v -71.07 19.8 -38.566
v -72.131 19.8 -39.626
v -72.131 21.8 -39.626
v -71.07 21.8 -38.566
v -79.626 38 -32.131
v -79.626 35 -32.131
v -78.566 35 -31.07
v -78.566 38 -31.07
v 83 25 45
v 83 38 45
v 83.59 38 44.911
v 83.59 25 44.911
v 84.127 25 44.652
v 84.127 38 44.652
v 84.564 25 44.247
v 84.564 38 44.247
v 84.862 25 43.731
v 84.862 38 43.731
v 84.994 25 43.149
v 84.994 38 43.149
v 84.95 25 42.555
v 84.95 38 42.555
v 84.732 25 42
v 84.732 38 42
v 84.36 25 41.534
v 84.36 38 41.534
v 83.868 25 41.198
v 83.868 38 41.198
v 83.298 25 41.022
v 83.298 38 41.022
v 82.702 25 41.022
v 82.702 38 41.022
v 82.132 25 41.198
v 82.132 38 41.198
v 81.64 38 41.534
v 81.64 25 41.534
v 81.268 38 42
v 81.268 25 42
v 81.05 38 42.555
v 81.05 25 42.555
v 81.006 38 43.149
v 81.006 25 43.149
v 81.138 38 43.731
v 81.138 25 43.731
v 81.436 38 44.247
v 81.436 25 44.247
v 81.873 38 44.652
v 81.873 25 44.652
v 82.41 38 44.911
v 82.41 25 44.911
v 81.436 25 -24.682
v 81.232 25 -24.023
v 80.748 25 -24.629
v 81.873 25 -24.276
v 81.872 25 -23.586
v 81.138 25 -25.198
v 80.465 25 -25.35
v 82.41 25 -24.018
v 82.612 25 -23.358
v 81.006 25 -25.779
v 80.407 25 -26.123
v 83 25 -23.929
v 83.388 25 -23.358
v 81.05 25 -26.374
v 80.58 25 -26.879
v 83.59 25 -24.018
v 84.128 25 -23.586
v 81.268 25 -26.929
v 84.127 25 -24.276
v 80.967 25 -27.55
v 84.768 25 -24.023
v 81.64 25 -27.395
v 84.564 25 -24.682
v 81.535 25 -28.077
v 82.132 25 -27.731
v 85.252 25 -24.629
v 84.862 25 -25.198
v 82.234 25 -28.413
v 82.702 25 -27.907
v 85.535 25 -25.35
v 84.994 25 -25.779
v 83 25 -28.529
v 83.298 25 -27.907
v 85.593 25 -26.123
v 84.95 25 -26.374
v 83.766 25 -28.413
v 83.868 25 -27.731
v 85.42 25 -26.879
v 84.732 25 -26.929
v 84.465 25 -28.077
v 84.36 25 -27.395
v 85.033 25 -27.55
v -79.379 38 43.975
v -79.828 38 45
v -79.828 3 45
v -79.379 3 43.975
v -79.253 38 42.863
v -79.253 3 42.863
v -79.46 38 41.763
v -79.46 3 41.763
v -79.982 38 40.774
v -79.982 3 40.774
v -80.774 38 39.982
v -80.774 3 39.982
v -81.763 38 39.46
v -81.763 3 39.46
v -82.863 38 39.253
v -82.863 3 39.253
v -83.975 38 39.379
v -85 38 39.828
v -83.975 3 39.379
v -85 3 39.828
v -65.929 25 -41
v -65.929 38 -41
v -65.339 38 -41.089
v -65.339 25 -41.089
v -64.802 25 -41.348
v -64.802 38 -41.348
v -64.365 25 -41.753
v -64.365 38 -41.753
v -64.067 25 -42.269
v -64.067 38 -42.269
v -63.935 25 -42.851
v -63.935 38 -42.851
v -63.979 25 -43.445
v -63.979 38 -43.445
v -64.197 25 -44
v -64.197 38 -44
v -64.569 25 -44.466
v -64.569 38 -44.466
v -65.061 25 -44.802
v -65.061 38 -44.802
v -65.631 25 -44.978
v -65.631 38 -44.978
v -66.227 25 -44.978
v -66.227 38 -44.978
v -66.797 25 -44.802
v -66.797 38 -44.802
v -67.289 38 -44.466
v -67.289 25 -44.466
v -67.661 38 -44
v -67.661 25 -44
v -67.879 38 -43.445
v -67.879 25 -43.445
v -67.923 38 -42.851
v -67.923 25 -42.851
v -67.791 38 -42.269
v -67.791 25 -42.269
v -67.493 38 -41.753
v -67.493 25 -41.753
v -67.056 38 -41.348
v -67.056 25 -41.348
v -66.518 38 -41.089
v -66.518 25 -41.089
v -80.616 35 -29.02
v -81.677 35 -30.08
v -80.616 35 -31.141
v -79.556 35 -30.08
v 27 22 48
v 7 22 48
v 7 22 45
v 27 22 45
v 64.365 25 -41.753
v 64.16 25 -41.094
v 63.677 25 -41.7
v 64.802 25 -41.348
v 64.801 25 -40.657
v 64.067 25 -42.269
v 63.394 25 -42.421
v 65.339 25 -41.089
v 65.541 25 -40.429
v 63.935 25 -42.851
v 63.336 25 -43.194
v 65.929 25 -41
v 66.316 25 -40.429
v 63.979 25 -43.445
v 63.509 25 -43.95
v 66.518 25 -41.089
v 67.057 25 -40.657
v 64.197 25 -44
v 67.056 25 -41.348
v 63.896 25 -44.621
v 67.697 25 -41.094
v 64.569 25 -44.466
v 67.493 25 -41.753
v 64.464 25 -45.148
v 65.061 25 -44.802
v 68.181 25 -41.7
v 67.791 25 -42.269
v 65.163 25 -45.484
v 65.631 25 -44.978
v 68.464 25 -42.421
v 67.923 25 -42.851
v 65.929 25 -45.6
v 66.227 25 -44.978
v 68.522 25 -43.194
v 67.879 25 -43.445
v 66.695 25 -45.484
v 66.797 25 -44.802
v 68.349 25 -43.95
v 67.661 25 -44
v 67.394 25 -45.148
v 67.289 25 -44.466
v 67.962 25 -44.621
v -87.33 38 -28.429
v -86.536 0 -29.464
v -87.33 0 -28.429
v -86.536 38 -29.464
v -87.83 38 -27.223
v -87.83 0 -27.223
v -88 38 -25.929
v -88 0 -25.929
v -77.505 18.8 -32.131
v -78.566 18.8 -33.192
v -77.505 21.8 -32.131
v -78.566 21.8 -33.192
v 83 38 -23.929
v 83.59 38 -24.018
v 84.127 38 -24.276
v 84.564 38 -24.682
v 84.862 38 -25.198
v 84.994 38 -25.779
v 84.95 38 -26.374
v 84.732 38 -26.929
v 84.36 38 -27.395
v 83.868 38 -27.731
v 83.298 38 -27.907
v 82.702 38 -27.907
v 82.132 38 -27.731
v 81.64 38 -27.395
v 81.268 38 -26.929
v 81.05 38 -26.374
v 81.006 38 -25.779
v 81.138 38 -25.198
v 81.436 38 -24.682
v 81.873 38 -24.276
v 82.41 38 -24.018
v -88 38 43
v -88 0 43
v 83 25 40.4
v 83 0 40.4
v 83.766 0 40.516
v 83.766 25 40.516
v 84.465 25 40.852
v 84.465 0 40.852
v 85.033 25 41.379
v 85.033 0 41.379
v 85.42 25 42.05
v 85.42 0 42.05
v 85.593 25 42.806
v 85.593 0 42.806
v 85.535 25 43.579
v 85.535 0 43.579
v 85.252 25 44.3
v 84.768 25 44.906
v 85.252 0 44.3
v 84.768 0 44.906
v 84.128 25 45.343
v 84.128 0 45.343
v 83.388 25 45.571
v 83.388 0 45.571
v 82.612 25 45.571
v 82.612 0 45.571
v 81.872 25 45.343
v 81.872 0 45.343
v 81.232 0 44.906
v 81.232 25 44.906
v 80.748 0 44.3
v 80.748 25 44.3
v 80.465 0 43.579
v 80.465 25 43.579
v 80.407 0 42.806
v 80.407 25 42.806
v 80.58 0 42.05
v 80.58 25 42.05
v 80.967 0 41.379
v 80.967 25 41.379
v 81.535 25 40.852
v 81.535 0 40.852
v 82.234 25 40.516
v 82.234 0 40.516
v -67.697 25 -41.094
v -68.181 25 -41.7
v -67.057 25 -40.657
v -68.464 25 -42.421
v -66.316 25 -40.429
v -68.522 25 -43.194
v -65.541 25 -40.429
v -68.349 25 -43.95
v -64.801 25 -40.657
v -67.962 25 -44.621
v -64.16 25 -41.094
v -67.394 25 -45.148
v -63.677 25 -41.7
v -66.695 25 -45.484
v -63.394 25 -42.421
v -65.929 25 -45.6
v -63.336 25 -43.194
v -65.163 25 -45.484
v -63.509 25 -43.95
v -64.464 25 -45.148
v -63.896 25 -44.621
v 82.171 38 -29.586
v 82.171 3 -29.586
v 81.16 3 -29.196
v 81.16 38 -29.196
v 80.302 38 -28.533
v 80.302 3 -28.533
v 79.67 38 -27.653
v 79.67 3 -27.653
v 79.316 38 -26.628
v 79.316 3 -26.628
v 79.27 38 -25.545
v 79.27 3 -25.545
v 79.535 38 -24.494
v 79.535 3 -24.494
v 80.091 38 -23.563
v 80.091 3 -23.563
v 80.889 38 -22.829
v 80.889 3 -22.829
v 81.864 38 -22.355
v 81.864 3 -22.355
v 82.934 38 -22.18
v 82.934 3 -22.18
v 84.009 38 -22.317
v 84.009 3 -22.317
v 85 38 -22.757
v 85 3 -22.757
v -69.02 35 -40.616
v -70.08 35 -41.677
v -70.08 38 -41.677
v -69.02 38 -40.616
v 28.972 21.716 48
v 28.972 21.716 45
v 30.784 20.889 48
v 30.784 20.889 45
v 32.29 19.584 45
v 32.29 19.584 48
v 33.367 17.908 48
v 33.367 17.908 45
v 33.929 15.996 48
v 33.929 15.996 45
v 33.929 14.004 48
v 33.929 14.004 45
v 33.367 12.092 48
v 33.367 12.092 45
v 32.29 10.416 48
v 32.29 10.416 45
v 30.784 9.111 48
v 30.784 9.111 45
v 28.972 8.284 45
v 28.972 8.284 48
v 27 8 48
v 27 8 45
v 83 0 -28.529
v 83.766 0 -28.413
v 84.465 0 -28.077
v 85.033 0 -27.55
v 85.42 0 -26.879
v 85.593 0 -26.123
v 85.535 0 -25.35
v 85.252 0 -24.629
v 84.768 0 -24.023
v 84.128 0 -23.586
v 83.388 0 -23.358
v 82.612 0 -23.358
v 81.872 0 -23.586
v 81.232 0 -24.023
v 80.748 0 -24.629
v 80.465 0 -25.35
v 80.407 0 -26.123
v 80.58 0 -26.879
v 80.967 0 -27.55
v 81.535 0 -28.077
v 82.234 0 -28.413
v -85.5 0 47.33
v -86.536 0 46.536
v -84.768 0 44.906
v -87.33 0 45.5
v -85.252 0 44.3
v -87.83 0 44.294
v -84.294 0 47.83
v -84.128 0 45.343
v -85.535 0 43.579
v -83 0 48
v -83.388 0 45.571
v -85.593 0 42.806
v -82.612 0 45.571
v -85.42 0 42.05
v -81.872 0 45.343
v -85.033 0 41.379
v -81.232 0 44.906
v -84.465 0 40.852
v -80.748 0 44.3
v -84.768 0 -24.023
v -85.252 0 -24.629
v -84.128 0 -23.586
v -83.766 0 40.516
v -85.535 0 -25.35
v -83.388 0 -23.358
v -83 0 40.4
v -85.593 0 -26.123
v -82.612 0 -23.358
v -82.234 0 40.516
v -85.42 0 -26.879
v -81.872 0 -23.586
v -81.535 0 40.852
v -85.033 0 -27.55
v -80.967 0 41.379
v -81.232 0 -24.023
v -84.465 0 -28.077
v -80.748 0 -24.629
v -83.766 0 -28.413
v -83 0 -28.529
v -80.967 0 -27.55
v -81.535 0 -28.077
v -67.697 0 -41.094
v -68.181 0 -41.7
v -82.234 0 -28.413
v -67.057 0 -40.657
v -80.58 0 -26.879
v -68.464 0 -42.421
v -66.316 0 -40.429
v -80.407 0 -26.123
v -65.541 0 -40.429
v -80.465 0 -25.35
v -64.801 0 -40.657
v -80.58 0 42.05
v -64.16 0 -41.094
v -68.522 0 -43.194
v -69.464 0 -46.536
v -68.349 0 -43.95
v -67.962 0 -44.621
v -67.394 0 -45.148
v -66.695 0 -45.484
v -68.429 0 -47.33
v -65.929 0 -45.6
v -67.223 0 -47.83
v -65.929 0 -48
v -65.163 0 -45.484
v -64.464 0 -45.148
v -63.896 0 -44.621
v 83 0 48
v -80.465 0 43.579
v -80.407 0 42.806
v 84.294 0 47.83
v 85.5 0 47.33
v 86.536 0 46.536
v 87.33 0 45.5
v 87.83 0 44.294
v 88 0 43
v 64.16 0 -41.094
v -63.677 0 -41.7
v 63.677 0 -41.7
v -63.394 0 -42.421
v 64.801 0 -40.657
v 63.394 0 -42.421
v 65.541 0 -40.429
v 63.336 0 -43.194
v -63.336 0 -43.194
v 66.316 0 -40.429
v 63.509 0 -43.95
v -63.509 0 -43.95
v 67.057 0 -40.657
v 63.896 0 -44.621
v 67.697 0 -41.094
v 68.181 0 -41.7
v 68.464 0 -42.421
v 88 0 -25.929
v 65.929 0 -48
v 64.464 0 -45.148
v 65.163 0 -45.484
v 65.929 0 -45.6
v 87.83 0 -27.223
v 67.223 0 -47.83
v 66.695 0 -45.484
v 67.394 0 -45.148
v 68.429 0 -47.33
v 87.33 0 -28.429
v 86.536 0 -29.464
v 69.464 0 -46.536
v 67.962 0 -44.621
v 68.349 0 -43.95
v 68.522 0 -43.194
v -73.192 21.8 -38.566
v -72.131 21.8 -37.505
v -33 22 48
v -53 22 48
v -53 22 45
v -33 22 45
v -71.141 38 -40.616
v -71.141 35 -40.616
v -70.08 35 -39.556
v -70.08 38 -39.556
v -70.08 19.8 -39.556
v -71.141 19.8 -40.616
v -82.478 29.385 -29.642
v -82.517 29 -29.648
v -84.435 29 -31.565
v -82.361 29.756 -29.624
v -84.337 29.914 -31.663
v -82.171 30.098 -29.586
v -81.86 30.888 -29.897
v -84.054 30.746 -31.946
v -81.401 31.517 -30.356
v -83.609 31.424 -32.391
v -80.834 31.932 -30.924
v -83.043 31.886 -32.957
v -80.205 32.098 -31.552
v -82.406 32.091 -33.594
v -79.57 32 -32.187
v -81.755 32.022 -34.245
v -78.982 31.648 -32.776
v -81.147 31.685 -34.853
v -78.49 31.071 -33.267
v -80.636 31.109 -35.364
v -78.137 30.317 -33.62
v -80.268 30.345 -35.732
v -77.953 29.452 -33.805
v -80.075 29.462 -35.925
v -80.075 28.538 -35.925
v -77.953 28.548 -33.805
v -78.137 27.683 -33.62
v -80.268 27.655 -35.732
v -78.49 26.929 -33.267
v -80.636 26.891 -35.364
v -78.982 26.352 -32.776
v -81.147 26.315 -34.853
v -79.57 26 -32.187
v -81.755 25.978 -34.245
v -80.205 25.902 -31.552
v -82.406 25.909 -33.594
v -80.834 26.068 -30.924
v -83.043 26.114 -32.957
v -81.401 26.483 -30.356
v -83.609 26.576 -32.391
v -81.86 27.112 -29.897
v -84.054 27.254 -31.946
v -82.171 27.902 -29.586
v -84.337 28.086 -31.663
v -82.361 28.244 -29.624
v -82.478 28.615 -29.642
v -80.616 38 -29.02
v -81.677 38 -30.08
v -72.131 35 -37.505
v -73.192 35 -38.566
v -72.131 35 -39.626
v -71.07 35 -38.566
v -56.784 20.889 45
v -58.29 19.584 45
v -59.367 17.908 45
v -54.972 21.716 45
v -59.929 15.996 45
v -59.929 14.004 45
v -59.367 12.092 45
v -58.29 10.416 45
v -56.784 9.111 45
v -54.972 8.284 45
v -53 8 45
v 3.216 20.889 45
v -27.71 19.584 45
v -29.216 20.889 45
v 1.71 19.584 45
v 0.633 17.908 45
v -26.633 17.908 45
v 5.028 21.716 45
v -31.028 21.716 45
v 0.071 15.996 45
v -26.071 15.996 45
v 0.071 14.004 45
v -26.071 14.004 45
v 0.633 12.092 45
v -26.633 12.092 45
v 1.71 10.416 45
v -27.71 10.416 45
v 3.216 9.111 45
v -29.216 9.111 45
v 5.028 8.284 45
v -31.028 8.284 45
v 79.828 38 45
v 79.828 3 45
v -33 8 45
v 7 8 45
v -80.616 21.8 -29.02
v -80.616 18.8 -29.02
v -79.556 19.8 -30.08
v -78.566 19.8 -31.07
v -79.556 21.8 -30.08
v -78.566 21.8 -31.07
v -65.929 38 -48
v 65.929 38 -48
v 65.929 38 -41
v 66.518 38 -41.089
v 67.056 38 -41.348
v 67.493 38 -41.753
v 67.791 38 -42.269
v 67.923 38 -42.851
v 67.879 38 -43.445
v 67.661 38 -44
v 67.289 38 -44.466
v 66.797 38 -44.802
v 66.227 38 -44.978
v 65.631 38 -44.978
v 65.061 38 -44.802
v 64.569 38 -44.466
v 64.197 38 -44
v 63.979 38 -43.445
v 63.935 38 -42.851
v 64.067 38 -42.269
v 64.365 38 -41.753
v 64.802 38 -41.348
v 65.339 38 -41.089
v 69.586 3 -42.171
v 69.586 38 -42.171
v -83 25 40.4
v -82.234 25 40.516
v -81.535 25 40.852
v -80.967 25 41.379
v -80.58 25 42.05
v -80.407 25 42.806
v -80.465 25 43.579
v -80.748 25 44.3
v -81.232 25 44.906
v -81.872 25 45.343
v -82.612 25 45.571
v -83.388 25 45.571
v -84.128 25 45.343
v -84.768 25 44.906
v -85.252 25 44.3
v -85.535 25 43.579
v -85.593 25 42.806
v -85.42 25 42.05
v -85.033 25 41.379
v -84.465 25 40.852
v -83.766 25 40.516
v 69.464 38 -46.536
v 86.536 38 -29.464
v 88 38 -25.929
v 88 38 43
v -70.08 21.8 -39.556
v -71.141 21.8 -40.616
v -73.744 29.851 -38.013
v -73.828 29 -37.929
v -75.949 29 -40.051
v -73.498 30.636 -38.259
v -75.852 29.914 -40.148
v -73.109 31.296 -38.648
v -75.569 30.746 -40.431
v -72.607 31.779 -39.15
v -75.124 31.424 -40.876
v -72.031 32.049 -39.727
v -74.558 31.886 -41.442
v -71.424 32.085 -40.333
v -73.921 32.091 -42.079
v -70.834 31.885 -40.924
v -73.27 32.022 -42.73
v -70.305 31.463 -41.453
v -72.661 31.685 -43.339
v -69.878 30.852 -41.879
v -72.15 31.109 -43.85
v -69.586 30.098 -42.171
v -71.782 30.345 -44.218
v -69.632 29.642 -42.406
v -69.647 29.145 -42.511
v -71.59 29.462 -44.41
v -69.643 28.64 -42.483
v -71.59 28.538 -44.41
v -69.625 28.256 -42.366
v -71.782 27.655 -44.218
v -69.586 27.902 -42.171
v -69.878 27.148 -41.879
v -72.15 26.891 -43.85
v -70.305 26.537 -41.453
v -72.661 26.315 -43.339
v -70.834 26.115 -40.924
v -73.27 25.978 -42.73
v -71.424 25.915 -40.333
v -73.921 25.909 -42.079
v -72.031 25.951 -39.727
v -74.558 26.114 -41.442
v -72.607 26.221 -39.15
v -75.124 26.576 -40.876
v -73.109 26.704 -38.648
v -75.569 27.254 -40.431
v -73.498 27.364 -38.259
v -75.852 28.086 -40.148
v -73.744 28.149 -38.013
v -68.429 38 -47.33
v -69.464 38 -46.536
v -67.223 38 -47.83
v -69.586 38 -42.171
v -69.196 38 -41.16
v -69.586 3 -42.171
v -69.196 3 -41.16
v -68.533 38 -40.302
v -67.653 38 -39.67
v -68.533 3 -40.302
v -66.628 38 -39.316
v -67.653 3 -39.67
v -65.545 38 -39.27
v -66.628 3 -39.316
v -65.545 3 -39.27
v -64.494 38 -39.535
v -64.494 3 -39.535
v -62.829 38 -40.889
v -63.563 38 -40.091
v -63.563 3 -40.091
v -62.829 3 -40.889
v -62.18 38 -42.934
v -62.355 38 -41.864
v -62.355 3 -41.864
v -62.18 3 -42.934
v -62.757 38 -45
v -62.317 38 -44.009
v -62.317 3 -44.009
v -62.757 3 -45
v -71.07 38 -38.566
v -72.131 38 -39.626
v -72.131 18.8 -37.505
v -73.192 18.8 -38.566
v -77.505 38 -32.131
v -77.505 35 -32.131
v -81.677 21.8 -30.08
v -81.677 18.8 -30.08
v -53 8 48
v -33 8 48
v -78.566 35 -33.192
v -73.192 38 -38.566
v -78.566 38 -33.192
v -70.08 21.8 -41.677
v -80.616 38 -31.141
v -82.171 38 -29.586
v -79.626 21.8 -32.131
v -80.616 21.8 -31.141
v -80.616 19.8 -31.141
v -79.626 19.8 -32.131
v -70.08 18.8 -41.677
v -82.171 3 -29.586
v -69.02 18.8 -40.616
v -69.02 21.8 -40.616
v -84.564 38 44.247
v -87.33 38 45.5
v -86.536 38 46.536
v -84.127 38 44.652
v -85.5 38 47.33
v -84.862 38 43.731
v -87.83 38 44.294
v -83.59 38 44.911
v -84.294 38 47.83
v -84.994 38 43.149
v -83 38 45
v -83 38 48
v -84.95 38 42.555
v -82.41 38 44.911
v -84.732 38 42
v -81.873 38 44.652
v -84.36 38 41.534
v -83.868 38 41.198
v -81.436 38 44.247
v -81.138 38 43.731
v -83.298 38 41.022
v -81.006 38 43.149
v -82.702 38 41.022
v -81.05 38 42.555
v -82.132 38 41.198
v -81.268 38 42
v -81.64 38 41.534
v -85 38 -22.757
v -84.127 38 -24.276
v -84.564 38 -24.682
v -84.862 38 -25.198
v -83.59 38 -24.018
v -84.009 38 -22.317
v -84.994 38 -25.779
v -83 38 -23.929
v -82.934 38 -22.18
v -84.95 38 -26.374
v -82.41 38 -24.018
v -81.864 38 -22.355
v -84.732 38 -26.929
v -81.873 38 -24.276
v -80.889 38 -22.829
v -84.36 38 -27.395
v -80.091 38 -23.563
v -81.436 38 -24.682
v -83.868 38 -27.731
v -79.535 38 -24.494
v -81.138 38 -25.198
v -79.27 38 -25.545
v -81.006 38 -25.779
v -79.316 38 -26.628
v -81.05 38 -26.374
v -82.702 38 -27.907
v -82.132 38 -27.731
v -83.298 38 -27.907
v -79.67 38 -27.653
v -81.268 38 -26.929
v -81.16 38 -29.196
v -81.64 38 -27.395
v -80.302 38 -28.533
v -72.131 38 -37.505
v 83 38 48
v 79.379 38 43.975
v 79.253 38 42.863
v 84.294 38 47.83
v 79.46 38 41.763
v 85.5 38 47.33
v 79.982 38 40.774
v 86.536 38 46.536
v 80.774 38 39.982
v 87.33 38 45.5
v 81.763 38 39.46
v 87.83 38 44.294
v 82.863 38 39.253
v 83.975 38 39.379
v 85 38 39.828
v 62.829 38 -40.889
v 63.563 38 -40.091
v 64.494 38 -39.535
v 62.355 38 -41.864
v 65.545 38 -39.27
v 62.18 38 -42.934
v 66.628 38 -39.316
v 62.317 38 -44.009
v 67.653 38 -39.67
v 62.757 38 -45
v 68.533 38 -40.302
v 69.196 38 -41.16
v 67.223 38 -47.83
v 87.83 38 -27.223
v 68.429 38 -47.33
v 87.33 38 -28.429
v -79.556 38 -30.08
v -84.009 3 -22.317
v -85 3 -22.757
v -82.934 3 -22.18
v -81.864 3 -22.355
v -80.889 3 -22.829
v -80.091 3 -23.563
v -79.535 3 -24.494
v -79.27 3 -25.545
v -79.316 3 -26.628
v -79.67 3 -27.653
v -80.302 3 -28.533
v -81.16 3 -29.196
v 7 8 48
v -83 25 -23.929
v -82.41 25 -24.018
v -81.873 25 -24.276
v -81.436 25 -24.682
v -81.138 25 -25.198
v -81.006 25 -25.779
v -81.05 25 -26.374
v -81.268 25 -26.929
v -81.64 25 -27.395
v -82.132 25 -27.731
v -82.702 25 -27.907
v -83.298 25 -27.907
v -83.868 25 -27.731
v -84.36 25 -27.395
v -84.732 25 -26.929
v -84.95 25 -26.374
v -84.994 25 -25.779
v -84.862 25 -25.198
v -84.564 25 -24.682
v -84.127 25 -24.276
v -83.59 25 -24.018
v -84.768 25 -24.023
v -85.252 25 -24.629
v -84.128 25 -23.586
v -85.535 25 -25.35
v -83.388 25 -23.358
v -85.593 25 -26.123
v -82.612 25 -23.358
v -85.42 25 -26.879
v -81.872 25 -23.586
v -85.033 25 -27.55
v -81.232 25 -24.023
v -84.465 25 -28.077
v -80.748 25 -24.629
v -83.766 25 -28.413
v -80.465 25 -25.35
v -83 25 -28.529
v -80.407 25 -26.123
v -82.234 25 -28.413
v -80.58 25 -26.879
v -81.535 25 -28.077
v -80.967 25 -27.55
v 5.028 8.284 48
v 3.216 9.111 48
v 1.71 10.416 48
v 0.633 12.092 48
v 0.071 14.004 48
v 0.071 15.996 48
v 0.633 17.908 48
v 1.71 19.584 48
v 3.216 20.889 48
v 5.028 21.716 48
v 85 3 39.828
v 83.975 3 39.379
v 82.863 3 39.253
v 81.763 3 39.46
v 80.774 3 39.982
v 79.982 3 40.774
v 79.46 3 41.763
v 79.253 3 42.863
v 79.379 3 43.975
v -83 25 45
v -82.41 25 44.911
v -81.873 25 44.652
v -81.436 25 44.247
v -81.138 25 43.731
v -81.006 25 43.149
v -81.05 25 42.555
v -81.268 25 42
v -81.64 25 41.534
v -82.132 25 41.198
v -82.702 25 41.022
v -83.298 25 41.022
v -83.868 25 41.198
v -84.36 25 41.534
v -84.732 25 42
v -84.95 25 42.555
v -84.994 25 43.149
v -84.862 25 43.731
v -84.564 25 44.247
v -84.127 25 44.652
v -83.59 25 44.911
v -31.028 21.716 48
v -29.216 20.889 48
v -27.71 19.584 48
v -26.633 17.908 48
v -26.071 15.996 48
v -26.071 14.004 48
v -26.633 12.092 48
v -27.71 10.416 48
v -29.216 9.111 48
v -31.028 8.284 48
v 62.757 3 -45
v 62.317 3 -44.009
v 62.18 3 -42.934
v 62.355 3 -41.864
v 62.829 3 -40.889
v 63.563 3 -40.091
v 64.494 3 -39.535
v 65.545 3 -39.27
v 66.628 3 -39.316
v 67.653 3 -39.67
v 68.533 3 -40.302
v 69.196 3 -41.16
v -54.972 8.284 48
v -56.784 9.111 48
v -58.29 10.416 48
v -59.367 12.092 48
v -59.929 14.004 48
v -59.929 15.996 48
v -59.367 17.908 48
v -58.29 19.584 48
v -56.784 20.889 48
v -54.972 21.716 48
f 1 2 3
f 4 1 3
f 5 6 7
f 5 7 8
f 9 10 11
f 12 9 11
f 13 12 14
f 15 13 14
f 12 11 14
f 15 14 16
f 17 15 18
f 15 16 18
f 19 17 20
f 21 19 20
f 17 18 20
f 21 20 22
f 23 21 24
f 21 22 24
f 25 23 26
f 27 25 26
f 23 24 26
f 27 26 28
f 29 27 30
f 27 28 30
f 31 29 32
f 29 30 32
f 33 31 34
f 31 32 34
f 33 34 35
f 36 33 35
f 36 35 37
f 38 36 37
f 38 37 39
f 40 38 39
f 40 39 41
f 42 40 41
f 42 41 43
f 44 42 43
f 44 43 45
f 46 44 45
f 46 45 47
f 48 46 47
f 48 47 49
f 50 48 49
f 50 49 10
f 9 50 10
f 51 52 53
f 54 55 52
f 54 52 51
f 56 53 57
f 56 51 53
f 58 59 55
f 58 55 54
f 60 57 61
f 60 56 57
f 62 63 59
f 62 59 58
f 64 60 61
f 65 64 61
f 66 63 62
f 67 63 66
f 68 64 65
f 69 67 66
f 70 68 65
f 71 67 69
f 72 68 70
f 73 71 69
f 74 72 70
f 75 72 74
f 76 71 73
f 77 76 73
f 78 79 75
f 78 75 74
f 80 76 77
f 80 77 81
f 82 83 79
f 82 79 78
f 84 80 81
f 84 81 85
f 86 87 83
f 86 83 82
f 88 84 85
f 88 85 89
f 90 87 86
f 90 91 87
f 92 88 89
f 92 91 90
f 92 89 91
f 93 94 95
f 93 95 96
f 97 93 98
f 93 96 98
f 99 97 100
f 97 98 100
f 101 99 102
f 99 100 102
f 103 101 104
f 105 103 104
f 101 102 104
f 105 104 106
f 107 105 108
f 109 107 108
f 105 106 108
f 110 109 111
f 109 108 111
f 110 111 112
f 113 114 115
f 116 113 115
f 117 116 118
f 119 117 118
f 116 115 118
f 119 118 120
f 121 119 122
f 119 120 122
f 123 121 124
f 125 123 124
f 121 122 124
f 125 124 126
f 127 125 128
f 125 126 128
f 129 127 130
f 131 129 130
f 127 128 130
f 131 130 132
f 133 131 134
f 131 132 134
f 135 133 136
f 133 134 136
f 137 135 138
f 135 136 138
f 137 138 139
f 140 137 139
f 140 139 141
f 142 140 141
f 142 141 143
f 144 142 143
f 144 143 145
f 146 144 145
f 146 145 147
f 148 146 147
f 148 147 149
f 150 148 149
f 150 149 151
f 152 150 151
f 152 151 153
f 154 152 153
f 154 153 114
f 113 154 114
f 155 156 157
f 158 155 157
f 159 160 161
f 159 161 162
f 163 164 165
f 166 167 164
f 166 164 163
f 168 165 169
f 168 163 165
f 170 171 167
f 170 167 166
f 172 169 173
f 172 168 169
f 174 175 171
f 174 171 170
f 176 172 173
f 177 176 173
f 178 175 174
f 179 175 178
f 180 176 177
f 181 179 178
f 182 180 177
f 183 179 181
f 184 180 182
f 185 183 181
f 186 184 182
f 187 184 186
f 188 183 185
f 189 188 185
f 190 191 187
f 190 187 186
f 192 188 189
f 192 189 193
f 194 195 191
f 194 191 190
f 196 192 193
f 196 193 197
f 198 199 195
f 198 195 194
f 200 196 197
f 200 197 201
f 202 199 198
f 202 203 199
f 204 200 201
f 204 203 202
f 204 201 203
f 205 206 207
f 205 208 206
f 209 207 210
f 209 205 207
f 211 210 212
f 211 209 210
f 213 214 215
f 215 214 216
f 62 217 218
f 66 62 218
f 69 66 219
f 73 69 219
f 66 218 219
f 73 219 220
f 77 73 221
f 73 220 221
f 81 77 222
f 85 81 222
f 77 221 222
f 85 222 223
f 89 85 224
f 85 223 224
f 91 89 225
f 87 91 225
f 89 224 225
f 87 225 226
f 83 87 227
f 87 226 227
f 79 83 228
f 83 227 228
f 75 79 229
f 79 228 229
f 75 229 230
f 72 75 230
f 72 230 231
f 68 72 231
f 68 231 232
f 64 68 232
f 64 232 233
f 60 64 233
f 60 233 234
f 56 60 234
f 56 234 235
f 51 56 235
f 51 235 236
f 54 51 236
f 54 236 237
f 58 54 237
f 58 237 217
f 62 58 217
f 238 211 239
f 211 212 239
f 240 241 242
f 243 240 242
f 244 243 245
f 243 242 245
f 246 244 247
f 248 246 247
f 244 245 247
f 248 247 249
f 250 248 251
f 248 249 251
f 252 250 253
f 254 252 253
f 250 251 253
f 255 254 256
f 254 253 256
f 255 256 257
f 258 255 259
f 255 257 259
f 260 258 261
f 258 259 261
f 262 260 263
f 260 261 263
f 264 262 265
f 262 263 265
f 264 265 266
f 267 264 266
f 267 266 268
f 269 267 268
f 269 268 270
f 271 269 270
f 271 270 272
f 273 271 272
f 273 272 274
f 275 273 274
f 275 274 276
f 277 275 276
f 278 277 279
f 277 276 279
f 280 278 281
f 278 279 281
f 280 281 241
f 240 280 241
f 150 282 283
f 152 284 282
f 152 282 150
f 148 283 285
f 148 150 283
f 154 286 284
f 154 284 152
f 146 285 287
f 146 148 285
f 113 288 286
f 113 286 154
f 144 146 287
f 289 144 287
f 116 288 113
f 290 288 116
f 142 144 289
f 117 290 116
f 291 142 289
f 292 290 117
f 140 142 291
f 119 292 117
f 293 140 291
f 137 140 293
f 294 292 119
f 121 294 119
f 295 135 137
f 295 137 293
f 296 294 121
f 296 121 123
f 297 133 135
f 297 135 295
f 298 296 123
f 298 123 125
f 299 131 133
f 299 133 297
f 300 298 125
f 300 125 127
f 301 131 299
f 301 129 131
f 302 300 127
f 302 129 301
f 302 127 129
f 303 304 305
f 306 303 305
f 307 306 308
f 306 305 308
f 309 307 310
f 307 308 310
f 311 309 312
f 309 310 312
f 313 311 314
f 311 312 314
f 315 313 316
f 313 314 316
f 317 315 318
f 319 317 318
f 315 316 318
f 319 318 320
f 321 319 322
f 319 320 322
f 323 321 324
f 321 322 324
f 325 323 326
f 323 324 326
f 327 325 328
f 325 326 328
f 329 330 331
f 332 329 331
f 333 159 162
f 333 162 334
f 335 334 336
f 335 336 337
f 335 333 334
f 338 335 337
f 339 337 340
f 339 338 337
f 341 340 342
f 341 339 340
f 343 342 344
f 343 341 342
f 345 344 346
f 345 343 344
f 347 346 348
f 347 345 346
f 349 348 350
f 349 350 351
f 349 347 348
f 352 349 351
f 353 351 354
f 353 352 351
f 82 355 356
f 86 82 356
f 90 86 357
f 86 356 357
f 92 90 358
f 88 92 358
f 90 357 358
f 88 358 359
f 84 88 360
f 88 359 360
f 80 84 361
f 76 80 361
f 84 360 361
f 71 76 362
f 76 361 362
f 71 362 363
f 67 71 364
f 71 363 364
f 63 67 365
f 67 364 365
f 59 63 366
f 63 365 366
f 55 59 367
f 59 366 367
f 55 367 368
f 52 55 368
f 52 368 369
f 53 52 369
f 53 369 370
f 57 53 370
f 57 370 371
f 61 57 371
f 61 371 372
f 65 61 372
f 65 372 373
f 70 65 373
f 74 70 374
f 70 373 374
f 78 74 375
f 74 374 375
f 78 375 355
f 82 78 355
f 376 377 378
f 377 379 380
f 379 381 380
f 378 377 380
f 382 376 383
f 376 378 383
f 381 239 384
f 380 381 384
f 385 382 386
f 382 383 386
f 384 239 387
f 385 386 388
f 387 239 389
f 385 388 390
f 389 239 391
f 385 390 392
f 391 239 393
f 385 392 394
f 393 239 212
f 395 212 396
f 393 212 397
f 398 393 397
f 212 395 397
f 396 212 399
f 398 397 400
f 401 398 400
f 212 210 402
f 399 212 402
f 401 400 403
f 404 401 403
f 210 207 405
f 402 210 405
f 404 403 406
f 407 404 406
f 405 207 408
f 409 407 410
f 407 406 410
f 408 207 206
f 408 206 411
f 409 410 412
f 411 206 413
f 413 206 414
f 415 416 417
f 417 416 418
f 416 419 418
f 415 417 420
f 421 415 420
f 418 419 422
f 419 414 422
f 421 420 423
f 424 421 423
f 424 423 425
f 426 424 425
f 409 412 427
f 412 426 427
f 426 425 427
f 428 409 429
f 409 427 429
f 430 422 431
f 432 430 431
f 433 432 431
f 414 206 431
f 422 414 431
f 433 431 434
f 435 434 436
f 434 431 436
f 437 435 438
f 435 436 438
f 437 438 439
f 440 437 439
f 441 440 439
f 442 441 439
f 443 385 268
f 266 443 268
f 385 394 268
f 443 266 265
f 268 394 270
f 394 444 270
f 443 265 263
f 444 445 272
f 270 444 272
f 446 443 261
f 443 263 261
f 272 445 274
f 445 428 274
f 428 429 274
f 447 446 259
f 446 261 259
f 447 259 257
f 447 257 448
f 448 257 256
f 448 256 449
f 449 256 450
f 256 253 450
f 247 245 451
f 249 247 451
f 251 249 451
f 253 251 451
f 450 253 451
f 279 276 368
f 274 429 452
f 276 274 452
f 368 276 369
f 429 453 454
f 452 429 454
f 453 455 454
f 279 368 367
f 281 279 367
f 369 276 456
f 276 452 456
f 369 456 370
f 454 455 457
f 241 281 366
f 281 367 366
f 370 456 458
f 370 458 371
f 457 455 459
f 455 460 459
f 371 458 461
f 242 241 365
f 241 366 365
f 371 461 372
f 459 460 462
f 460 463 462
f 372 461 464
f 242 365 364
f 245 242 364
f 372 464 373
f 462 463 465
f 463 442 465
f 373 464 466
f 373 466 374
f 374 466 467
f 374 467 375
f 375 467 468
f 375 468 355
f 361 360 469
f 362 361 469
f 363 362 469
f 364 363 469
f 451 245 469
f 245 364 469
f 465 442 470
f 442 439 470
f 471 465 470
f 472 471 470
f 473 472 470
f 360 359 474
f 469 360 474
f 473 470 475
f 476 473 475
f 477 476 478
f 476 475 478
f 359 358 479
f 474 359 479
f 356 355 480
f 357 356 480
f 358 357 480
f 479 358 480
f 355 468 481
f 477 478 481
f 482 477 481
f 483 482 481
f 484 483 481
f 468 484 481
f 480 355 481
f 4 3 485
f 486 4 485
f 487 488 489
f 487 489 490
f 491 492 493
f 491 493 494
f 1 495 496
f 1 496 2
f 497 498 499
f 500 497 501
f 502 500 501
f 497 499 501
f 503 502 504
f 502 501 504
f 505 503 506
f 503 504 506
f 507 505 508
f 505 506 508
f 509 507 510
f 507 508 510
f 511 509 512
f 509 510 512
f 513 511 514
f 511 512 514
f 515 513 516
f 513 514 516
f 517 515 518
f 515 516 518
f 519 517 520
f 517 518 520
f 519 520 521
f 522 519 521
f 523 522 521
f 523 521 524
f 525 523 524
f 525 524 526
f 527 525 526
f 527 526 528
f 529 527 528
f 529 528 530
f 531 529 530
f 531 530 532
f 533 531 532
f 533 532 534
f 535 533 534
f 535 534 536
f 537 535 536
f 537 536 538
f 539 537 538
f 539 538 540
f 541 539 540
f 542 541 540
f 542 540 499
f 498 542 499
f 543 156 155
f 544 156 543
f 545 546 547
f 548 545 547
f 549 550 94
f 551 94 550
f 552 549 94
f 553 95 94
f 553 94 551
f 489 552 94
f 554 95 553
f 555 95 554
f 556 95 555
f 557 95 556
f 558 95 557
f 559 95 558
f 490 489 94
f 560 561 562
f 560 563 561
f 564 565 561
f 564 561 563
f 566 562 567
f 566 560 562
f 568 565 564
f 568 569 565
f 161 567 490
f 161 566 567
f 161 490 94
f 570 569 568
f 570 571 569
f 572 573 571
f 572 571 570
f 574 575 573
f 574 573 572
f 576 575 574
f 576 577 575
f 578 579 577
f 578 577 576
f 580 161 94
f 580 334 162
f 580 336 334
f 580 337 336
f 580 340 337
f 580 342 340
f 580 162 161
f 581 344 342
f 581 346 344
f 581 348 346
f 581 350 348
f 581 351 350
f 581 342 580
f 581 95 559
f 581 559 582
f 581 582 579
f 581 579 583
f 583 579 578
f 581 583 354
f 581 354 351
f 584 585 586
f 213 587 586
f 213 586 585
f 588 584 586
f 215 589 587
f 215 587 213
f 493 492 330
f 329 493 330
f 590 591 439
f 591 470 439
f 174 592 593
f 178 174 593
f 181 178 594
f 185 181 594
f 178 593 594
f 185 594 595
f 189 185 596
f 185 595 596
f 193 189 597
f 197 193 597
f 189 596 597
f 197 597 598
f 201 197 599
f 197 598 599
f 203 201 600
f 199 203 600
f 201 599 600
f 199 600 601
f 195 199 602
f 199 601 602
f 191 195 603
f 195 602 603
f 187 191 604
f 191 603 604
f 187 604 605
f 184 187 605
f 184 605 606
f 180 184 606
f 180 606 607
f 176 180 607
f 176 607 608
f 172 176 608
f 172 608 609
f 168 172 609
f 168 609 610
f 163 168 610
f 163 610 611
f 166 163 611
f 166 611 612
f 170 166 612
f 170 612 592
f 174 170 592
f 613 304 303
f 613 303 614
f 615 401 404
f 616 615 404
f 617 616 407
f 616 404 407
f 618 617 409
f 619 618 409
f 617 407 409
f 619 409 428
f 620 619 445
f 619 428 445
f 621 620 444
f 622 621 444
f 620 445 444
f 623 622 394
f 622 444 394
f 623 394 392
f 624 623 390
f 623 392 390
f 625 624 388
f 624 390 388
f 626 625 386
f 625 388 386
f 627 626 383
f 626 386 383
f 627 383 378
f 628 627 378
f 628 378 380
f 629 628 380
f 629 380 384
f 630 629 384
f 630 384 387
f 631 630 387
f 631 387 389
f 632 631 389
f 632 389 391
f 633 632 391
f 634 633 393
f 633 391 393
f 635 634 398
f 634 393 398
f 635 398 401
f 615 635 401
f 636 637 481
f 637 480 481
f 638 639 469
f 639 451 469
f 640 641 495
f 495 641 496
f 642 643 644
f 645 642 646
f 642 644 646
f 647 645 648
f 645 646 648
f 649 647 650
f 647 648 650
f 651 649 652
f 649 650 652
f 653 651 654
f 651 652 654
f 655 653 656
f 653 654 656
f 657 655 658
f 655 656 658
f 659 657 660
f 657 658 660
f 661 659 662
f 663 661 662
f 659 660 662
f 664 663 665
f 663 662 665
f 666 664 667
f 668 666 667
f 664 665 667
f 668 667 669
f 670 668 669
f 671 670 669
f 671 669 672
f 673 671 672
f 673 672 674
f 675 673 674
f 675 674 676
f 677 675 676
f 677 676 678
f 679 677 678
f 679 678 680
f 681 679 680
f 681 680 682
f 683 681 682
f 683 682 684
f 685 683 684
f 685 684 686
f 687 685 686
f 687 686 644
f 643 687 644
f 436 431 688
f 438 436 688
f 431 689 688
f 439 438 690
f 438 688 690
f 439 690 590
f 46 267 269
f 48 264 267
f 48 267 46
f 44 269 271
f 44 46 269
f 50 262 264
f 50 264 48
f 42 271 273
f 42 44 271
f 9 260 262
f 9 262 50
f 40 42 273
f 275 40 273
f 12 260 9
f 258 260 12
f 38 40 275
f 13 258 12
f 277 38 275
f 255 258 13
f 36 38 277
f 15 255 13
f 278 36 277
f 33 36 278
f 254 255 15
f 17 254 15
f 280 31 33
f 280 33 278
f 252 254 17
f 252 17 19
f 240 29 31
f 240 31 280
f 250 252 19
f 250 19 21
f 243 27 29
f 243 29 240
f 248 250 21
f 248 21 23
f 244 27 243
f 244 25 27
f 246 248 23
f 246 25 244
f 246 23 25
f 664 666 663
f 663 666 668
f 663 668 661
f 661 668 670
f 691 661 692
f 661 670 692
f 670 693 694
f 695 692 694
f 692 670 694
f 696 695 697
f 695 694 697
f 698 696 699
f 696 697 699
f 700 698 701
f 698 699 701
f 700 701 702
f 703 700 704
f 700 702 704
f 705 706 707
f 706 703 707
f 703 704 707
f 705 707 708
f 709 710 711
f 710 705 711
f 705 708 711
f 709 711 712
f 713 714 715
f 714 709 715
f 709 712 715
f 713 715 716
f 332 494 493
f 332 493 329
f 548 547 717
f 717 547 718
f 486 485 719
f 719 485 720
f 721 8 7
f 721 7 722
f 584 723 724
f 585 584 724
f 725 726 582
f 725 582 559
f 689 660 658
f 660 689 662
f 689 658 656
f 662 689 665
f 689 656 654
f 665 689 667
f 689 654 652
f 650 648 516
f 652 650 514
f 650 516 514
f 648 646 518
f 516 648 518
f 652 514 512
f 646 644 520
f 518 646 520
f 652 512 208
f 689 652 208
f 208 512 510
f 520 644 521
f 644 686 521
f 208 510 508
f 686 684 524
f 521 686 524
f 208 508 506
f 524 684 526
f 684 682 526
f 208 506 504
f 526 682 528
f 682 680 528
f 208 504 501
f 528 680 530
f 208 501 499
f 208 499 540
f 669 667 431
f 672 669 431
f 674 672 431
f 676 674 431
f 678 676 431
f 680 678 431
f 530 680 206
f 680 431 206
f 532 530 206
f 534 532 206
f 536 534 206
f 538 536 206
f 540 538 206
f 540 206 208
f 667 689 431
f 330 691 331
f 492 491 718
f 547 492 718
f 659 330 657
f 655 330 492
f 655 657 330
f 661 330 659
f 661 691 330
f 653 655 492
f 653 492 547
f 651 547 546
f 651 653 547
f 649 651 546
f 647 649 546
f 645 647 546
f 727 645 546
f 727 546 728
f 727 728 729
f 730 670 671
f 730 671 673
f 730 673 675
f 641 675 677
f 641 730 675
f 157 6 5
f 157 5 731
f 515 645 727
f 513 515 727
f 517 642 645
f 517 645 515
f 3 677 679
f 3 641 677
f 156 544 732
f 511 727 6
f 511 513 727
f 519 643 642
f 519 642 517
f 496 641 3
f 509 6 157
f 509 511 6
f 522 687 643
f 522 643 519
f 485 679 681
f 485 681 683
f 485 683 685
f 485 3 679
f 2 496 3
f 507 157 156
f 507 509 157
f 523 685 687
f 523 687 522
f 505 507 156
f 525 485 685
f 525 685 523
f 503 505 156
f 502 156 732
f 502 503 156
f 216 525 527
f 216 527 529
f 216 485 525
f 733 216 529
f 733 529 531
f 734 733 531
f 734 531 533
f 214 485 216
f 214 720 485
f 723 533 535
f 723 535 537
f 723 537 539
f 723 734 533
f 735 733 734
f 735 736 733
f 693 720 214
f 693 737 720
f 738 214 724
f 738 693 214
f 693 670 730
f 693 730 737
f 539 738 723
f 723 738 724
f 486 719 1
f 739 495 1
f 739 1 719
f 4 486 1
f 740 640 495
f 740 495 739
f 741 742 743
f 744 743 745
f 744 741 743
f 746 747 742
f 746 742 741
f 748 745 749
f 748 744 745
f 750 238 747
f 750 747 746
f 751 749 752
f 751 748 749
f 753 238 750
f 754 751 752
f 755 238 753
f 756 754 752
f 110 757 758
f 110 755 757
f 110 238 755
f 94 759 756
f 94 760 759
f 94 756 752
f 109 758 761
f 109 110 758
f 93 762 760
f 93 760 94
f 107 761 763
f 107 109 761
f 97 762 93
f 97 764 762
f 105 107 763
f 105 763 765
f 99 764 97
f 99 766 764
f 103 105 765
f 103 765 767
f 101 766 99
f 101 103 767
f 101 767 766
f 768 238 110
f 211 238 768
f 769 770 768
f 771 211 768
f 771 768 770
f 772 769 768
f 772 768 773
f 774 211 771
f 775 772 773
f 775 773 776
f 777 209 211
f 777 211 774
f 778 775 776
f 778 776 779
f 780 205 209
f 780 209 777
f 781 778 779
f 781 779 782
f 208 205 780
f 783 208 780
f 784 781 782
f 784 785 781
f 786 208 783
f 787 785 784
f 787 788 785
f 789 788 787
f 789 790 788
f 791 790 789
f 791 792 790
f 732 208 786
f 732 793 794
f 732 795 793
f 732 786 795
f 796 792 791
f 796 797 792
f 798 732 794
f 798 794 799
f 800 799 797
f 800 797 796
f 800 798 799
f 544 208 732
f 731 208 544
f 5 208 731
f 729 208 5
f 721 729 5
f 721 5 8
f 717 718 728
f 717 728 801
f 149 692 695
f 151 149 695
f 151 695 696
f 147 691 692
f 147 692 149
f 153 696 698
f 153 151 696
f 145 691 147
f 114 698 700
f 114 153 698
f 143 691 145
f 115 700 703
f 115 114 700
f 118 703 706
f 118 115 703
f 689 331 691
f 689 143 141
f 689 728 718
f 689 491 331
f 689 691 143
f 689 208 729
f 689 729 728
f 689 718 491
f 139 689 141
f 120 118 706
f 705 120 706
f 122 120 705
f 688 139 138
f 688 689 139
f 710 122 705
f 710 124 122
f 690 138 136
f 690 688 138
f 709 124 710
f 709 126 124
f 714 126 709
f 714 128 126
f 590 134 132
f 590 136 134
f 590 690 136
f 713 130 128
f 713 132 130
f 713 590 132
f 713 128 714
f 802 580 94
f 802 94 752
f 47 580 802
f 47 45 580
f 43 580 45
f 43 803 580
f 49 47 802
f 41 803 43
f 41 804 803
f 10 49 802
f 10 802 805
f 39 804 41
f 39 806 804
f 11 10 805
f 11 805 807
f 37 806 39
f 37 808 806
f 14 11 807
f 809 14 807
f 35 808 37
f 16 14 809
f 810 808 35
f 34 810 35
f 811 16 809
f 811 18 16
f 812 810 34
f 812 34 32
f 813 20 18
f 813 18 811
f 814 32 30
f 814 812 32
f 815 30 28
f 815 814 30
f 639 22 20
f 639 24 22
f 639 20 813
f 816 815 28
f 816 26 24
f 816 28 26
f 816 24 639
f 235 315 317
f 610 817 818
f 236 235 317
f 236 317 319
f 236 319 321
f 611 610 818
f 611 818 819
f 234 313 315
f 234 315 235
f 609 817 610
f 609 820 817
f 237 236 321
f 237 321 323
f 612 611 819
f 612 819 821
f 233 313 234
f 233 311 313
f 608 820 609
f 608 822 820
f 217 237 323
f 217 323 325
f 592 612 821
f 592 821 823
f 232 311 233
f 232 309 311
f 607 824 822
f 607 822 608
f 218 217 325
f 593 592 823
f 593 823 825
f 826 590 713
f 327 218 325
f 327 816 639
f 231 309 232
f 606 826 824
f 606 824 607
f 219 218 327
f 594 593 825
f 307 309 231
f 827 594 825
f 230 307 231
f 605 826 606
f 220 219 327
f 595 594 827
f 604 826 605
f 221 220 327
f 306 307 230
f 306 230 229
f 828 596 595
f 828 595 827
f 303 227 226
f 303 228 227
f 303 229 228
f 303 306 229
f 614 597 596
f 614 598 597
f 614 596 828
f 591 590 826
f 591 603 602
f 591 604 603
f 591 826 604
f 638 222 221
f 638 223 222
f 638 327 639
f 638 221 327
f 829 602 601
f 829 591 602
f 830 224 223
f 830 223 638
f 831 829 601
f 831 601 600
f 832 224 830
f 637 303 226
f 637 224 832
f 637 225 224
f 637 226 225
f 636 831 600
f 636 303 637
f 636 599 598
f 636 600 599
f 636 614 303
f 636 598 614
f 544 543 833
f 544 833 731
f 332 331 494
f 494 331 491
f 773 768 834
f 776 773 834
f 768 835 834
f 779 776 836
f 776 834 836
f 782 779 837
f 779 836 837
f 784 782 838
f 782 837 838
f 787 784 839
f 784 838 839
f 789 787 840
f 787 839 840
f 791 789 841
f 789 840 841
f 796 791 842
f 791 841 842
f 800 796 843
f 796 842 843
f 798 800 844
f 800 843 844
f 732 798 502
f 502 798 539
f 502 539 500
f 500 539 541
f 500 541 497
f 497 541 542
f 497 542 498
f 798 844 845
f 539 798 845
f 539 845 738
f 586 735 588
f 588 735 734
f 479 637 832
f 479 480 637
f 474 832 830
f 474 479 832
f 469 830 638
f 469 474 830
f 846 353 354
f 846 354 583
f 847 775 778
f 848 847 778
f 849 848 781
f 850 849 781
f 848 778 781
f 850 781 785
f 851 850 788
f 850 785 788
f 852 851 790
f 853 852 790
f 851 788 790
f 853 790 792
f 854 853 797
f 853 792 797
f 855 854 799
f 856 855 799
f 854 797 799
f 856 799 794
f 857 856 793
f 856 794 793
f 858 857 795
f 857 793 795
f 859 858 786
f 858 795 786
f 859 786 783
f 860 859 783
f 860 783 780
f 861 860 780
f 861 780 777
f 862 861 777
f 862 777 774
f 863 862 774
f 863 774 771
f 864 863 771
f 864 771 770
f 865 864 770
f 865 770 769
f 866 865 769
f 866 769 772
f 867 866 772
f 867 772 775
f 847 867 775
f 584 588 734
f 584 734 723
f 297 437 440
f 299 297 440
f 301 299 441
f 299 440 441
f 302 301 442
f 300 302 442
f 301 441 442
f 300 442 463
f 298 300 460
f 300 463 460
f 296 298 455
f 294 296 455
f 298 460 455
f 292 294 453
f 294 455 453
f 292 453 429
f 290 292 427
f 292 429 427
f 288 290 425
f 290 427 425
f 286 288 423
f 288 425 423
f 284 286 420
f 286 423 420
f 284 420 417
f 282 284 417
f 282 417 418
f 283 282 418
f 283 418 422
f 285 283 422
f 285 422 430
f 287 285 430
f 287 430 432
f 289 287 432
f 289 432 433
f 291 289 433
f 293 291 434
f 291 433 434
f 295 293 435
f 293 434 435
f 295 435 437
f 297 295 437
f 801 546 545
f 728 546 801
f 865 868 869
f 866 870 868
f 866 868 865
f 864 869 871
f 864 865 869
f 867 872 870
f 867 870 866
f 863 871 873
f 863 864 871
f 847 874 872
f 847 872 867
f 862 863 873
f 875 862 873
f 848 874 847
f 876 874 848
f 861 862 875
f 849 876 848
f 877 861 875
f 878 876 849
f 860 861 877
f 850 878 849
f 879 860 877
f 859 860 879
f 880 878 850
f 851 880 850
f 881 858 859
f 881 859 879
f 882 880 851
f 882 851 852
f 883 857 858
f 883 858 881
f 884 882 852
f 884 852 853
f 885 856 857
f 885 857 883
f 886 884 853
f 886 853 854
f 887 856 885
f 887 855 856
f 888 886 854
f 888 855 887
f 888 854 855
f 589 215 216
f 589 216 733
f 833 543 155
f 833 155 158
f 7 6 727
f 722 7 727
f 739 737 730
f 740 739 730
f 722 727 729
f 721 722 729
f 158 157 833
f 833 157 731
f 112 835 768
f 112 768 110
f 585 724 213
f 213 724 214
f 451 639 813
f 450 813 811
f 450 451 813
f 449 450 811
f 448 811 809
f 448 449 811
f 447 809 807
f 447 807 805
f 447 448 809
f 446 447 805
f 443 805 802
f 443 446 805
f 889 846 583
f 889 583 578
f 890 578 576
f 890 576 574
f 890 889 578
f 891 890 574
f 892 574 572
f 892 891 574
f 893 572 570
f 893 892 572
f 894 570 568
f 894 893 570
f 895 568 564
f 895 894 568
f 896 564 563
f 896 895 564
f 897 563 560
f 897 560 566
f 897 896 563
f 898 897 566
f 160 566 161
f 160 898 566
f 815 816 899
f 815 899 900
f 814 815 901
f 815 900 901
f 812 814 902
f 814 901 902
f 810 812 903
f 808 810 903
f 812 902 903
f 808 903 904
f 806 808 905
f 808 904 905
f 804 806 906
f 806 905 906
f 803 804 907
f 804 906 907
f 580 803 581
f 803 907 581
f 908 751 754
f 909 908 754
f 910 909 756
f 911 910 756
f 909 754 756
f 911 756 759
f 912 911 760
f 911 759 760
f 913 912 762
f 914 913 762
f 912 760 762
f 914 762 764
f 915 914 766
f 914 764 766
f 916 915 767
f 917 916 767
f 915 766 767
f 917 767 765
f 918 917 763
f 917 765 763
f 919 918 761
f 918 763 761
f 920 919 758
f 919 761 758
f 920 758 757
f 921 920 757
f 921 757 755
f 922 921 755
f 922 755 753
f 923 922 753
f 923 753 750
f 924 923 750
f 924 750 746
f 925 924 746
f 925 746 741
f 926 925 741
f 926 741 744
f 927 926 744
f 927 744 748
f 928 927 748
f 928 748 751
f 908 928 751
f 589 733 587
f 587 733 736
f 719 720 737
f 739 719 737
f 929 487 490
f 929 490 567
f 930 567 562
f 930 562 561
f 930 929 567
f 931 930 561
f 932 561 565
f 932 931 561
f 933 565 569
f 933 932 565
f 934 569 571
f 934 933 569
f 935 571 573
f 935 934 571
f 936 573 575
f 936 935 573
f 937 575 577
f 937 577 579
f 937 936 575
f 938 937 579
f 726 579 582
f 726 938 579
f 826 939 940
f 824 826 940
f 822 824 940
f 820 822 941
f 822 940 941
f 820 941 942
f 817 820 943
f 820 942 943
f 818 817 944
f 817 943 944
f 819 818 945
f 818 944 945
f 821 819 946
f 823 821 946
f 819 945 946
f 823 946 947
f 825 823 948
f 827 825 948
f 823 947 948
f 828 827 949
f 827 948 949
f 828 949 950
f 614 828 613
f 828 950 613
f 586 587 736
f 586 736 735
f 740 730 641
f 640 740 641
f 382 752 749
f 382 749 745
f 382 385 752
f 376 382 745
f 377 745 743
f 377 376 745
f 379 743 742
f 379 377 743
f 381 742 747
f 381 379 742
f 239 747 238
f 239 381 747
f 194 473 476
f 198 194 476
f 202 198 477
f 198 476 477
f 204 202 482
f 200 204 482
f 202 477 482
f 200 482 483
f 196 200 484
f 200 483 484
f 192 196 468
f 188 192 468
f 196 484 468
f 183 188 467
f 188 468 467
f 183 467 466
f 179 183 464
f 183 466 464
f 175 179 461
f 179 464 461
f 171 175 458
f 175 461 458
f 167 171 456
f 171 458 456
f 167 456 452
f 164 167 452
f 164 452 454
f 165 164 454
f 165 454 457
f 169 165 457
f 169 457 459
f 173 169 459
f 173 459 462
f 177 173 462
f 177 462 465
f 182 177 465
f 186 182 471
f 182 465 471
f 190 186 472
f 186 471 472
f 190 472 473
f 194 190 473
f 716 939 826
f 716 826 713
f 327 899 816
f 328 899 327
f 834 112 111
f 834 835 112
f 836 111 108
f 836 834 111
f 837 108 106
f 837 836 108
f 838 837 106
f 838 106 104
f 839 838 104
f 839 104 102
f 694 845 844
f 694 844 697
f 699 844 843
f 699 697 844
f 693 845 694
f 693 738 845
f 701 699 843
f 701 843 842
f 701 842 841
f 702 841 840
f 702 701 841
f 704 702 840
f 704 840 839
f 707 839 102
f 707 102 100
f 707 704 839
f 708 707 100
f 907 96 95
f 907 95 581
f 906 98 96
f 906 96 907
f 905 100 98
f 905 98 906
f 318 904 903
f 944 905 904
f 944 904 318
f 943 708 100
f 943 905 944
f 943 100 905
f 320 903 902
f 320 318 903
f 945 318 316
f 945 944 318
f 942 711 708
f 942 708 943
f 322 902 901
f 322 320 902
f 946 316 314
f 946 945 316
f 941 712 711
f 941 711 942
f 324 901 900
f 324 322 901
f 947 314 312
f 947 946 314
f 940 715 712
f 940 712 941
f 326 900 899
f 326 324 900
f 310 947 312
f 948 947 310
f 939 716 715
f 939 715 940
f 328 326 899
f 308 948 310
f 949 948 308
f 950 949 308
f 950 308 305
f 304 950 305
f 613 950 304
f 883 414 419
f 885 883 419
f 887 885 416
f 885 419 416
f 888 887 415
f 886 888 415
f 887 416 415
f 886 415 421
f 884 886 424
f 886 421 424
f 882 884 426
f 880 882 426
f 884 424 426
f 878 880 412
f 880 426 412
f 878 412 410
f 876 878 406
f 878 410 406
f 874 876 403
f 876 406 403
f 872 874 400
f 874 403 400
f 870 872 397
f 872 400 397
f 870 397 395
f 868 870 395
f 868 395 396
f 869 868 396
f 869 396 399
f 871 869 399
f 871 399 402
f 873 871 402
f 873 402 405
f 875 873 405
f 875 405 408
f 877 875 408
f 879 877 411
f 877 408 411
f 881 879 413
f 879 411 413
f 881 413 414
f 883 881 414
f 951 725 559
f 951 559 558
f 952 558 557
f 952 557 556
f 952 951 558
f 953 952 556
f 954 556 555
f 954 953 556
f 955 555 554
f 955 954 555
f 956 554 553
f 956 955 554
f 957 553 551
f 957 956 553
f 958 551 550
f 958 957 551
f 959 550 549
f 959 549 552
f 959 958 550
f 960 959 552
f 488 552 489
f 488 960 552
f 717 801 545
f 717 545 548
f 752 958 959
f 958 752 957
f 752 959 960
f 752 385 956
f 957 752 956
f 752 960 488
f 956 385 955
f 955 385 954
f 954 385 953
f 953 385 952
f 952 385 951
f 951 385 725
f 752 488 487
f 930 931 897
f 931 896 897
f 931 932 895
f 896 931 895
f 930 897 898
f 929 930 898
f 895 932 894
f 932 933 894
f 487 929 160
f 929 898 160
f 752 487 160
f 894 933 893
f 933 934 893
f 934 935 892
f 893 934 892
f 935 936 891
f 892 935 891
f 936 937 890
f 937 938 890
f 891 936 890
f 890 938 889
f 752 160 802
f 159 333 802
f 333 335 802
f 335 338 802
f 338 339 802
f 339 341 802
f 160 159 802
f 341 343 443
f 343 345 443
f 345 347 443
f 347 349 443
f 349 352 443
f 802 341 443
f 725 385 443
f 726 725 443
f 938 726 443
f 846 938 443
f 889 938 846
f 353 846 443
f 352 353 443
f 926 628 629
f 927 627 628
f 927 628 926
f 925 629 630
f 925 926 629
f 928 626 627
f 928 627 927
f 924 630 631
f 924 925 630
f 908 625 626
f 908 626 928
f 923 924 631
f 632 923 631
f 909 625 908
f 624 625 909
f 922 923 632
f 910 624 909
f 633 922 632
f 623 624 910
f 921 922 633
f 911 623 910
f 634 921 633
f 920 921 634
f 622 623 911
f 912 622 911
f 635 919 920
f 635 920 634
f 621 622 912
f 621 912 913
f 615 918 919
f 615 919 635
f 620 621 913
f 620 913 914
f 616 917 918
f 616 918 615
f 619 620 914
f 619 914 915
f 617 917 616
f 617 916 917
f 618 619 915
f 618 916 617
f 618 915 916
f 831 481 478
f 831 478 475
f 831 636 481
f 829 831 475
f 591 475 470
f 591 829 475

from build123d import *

# Parameters (mm, degrees)
BOSS_EXTRUDE1_DEPTH = 3
BOSS_EXTRUDE2_DEPTH = 35
SKETCH3_R           = 3.1
CUT_EXTRUDE1_DEPTH  = 10
SKETCH4_W           = 1.5
SKETCH4_H           = 3
BOSS_EXTRUDE3_DEPTH = 1.5
SKETCH6_R           = 3.75
BOSS_EXTRUDE4_DEPTH = 35
SKETCH7_R           = 2
CUT_EXTRUDE2_DEPTH  = 38
SKETCH8_R           = 2.6
CUT_EXTRUDE3_DEPTH  = 25
CUT_EXTRUDE4_DEPTH  = 3
FILLET1_R           = 5


with BuildPart() as part:
    # Sketch1 → Boss-Extrude1 (new body)
    with BuildSketch(Plane(origin=(0, 0, 0), x_dir=(1, 0, 0), z_dir=(0, 1, 0))):
        Polygon((-68, 48), (-88, 28), (-88, -48), (88, -48), (88, 28), (68, 48), align=None)
    extrude(amount=BOSS_EXTRUDE1_DEPTH)

    # Sketch2 → Boss-Extrude2 (add)
    with BuildSketch(Plane(origin=(0, 3, 0), x_dir=(1, 0, 0), z_dir=(0, 1, 0))):
        Polygon((88, 28), (68, 48), (-68, 48), (-88, 28), (-88, -48), (88, -48), align=None)
        Polygon((85, -45), (85, 26.757359313), (66.757359313, 45), (-66.757359313, 45), (-85, 26.757359313), (-85, -45), align=None, mode=Mode.SUBTRACT)
    extrude(amount=BOSS_EXTRUDE2_DEPTH)

    # Sketch3 → Cut-Extrude1 (cut)
    with BuildSketch(Plane(origin=(-58, 0, -58), x_dir=(-0.7071067811865475, 0, 0.7071067811865477), z_dir=(-0.7071067811865477, 0, -0.7071067811865475))):
        with Locations((34.284271247, 29)):
            Circle(SKETCH3_R)
        with Locations((22.284271247, 29)):
            Circle(SKETCH3_R)
    extrude(amount=-CUT_EXTRUDE1_DEPTH, mode=Mode.SUBTRACT)

    # Sketch4 → Boss-Extrude3 (add)
    with BuildSketch(Plane(origin=(-55.878679656, 0, -55.878679656), x_dir=(0.7071067811865476, 0, -0.7071067811865475), z_dir=(0.7071067811865475, 0, 0.7071067811865476))):
        with Locations((-20.834271247, 36.5)):
            Rectangle(SKETCH4_W, SKETCH4_H)
        Polygon((-22.284271247, 18.8), (-22.284271247, 19.8), (-22.984271247, 19.8), (-22.984271247, 21.8), (-24.484271247, 21.8), (-24.484271247, 18.8), align=None)
        Polygon((-21.584271247, 19.8), (-22.284271247, 19.8), (-22.284271247, 18.8), (-20.084271247, 18.8), (-20.084271247, 21.8), (-21.584271247, 21.8), align=None)
        Polygon((-32.084271247, 18.8), (-32.084271247, 21.8), (-33.584271247, 21.8), (-33.584271247, 19.8), (-34.984271247, 19.8), (-34.984271247, 21.8), (-36.484271247, 21.8), (-36.484271247, 18.8), align=None)
        with Locations((-35.734271247, 36.5)):
            Rectangle(SKETCH4_W, SKETCH4_H)
        with Locations((-23.734271247, 36.5)):
            Rectangle(SKETCH4_W, SKETCH4_H)
        with Locations((-32.834271247, 36.5)):
            Rectangle(SKETCH4_W, SKETCH4_H)
    extrude(amount=BOSS_EXTRUDE3_DEPTH)

    # Sketch6 → Boss-Extrude4 (add)
    with BuildSketch(Plane(origin=(0, 3, 0), x_dir=(1, 0, 0), z_dir=(0, 1, 0))):
        with Locations((-65.928932188, 43)):
            Circle(SKETCH6_R)
        with Locations((65.928932188, 43)):
            Circle(SKETCH6_R)
        with Locations((83, 25.928932188)):
            Circle(SKETCH6_R)
        with Locations((83, -43)):
            Circle(SKETCH6_R)
        with Locations((-83, -43)):
            Circle(SKETCH6_R)
        with Locations((-83, 25.928932188)):
            Circle(SKETCH6_R)
    extrude(amount=BOSS_EXTRUDE4_DEPTH)

    # Sketch7 → Cut-Extrude2 (cut)
    with BuildSketch(Plane(origin=(0, 38, 0), x_dir=(1, 0, 0), z_dir=(0, 1, 0))):
        with Locations(Location((-65.928932188, 43, 0), (0, 0, 270))):
            Circle(SKETCH7_R)
        with Locations(Location((-83, 25.928932188, 0), (0, 0, 270))):
            Circle(SKETCH7_R)
        with Locations(Location((-83, -43, 0), (0, 0, 270))):
            Circle(SKETCH7_R)
        with Locations(Location((83, -43, 0), (0, 0, 270))):
            Circle(SKETCH7_R)
        with Locations(Location((83, 25.928932188, 0), (0, 0, 270))):
            Circle(SKETCH7_R)
        with Locations(Location((65.928932188, 43, 0), (0, 0, 270))):
            Circle(SKETCH7_R)
    extrude(amount=-CUT_EXTRUDE2_DEPTH, mode=Mode.SUBTRACT)

    # Sketch8 → Cut-Extrude3 (cut)
    with BuildSketch(Plane.XZ):
        with Locations(Location((-83, 43, 0), (0, 0, 270))):
            Circle(SKETCH8_R)
        with Locations(Location((83, 43, 0), (0, 0, 270))):
            Circle(SKETCH8_R)
        with Locations(Location((83, -25.928932188, 0), (0, 0, 270))):
            Circle(SKETCH8_R)
        with Locations(Location((65.928932188, -43, 0), (0, 0, 270))):
            Circle(SKETCH8_R)
        with Locations(Location((-65.928932188, -43, 0), (0, 0, 270))):
            Circle(SKETCH8_R)
        with Locations(Location((-83, -25.928932188, 0), (0, 0, 270))):
            Circle(SKETCH8_R)
    extrude(amount=-CUT_EXTRUDE3_DEPTH, mode=Mode.SUBTRACT)

    # Sketch9 → Cut-Extrude4 (cut)
    with BuildSketch(Plane.XY.offset(48)):
        with BuildLine():
            Line((-33, 8), (-53, 8))
            ThreePointArc((-53, 8), (-60, 15), (-53, 22))
            Line((-53, 22), (-33, 22))
            ThreePointArc((-33, 22), (-26, 15), (-33, 8))
        make_face()
        with BuildLine():
            Line((27, 8), (7, 8))
            ThreePointArc((7, 8), (0, 15), (7, 22))
            Line((7, 22), (27, 22))
            ThreePointArc((27, 22), (34, 15), (27, 8))
        make_face()
    extrude(amount=-CUT_EXTRUDE4_DEPTH, mode=Mode.SUBTRACT)

    # Fillet1
    fillet1_edges = [part.edges().sort_by_distance(p)[0] for p in [
        (88, 19, 48),
        (-88, 19, 48),
        (-88, 19, -28),
        (-68, 19, -48),
        (68, 19, -48),
        (88, 19, -28),
    ]]
    fillet(fillet1_edges, radius=FILLET1_R)


solid = part.part
